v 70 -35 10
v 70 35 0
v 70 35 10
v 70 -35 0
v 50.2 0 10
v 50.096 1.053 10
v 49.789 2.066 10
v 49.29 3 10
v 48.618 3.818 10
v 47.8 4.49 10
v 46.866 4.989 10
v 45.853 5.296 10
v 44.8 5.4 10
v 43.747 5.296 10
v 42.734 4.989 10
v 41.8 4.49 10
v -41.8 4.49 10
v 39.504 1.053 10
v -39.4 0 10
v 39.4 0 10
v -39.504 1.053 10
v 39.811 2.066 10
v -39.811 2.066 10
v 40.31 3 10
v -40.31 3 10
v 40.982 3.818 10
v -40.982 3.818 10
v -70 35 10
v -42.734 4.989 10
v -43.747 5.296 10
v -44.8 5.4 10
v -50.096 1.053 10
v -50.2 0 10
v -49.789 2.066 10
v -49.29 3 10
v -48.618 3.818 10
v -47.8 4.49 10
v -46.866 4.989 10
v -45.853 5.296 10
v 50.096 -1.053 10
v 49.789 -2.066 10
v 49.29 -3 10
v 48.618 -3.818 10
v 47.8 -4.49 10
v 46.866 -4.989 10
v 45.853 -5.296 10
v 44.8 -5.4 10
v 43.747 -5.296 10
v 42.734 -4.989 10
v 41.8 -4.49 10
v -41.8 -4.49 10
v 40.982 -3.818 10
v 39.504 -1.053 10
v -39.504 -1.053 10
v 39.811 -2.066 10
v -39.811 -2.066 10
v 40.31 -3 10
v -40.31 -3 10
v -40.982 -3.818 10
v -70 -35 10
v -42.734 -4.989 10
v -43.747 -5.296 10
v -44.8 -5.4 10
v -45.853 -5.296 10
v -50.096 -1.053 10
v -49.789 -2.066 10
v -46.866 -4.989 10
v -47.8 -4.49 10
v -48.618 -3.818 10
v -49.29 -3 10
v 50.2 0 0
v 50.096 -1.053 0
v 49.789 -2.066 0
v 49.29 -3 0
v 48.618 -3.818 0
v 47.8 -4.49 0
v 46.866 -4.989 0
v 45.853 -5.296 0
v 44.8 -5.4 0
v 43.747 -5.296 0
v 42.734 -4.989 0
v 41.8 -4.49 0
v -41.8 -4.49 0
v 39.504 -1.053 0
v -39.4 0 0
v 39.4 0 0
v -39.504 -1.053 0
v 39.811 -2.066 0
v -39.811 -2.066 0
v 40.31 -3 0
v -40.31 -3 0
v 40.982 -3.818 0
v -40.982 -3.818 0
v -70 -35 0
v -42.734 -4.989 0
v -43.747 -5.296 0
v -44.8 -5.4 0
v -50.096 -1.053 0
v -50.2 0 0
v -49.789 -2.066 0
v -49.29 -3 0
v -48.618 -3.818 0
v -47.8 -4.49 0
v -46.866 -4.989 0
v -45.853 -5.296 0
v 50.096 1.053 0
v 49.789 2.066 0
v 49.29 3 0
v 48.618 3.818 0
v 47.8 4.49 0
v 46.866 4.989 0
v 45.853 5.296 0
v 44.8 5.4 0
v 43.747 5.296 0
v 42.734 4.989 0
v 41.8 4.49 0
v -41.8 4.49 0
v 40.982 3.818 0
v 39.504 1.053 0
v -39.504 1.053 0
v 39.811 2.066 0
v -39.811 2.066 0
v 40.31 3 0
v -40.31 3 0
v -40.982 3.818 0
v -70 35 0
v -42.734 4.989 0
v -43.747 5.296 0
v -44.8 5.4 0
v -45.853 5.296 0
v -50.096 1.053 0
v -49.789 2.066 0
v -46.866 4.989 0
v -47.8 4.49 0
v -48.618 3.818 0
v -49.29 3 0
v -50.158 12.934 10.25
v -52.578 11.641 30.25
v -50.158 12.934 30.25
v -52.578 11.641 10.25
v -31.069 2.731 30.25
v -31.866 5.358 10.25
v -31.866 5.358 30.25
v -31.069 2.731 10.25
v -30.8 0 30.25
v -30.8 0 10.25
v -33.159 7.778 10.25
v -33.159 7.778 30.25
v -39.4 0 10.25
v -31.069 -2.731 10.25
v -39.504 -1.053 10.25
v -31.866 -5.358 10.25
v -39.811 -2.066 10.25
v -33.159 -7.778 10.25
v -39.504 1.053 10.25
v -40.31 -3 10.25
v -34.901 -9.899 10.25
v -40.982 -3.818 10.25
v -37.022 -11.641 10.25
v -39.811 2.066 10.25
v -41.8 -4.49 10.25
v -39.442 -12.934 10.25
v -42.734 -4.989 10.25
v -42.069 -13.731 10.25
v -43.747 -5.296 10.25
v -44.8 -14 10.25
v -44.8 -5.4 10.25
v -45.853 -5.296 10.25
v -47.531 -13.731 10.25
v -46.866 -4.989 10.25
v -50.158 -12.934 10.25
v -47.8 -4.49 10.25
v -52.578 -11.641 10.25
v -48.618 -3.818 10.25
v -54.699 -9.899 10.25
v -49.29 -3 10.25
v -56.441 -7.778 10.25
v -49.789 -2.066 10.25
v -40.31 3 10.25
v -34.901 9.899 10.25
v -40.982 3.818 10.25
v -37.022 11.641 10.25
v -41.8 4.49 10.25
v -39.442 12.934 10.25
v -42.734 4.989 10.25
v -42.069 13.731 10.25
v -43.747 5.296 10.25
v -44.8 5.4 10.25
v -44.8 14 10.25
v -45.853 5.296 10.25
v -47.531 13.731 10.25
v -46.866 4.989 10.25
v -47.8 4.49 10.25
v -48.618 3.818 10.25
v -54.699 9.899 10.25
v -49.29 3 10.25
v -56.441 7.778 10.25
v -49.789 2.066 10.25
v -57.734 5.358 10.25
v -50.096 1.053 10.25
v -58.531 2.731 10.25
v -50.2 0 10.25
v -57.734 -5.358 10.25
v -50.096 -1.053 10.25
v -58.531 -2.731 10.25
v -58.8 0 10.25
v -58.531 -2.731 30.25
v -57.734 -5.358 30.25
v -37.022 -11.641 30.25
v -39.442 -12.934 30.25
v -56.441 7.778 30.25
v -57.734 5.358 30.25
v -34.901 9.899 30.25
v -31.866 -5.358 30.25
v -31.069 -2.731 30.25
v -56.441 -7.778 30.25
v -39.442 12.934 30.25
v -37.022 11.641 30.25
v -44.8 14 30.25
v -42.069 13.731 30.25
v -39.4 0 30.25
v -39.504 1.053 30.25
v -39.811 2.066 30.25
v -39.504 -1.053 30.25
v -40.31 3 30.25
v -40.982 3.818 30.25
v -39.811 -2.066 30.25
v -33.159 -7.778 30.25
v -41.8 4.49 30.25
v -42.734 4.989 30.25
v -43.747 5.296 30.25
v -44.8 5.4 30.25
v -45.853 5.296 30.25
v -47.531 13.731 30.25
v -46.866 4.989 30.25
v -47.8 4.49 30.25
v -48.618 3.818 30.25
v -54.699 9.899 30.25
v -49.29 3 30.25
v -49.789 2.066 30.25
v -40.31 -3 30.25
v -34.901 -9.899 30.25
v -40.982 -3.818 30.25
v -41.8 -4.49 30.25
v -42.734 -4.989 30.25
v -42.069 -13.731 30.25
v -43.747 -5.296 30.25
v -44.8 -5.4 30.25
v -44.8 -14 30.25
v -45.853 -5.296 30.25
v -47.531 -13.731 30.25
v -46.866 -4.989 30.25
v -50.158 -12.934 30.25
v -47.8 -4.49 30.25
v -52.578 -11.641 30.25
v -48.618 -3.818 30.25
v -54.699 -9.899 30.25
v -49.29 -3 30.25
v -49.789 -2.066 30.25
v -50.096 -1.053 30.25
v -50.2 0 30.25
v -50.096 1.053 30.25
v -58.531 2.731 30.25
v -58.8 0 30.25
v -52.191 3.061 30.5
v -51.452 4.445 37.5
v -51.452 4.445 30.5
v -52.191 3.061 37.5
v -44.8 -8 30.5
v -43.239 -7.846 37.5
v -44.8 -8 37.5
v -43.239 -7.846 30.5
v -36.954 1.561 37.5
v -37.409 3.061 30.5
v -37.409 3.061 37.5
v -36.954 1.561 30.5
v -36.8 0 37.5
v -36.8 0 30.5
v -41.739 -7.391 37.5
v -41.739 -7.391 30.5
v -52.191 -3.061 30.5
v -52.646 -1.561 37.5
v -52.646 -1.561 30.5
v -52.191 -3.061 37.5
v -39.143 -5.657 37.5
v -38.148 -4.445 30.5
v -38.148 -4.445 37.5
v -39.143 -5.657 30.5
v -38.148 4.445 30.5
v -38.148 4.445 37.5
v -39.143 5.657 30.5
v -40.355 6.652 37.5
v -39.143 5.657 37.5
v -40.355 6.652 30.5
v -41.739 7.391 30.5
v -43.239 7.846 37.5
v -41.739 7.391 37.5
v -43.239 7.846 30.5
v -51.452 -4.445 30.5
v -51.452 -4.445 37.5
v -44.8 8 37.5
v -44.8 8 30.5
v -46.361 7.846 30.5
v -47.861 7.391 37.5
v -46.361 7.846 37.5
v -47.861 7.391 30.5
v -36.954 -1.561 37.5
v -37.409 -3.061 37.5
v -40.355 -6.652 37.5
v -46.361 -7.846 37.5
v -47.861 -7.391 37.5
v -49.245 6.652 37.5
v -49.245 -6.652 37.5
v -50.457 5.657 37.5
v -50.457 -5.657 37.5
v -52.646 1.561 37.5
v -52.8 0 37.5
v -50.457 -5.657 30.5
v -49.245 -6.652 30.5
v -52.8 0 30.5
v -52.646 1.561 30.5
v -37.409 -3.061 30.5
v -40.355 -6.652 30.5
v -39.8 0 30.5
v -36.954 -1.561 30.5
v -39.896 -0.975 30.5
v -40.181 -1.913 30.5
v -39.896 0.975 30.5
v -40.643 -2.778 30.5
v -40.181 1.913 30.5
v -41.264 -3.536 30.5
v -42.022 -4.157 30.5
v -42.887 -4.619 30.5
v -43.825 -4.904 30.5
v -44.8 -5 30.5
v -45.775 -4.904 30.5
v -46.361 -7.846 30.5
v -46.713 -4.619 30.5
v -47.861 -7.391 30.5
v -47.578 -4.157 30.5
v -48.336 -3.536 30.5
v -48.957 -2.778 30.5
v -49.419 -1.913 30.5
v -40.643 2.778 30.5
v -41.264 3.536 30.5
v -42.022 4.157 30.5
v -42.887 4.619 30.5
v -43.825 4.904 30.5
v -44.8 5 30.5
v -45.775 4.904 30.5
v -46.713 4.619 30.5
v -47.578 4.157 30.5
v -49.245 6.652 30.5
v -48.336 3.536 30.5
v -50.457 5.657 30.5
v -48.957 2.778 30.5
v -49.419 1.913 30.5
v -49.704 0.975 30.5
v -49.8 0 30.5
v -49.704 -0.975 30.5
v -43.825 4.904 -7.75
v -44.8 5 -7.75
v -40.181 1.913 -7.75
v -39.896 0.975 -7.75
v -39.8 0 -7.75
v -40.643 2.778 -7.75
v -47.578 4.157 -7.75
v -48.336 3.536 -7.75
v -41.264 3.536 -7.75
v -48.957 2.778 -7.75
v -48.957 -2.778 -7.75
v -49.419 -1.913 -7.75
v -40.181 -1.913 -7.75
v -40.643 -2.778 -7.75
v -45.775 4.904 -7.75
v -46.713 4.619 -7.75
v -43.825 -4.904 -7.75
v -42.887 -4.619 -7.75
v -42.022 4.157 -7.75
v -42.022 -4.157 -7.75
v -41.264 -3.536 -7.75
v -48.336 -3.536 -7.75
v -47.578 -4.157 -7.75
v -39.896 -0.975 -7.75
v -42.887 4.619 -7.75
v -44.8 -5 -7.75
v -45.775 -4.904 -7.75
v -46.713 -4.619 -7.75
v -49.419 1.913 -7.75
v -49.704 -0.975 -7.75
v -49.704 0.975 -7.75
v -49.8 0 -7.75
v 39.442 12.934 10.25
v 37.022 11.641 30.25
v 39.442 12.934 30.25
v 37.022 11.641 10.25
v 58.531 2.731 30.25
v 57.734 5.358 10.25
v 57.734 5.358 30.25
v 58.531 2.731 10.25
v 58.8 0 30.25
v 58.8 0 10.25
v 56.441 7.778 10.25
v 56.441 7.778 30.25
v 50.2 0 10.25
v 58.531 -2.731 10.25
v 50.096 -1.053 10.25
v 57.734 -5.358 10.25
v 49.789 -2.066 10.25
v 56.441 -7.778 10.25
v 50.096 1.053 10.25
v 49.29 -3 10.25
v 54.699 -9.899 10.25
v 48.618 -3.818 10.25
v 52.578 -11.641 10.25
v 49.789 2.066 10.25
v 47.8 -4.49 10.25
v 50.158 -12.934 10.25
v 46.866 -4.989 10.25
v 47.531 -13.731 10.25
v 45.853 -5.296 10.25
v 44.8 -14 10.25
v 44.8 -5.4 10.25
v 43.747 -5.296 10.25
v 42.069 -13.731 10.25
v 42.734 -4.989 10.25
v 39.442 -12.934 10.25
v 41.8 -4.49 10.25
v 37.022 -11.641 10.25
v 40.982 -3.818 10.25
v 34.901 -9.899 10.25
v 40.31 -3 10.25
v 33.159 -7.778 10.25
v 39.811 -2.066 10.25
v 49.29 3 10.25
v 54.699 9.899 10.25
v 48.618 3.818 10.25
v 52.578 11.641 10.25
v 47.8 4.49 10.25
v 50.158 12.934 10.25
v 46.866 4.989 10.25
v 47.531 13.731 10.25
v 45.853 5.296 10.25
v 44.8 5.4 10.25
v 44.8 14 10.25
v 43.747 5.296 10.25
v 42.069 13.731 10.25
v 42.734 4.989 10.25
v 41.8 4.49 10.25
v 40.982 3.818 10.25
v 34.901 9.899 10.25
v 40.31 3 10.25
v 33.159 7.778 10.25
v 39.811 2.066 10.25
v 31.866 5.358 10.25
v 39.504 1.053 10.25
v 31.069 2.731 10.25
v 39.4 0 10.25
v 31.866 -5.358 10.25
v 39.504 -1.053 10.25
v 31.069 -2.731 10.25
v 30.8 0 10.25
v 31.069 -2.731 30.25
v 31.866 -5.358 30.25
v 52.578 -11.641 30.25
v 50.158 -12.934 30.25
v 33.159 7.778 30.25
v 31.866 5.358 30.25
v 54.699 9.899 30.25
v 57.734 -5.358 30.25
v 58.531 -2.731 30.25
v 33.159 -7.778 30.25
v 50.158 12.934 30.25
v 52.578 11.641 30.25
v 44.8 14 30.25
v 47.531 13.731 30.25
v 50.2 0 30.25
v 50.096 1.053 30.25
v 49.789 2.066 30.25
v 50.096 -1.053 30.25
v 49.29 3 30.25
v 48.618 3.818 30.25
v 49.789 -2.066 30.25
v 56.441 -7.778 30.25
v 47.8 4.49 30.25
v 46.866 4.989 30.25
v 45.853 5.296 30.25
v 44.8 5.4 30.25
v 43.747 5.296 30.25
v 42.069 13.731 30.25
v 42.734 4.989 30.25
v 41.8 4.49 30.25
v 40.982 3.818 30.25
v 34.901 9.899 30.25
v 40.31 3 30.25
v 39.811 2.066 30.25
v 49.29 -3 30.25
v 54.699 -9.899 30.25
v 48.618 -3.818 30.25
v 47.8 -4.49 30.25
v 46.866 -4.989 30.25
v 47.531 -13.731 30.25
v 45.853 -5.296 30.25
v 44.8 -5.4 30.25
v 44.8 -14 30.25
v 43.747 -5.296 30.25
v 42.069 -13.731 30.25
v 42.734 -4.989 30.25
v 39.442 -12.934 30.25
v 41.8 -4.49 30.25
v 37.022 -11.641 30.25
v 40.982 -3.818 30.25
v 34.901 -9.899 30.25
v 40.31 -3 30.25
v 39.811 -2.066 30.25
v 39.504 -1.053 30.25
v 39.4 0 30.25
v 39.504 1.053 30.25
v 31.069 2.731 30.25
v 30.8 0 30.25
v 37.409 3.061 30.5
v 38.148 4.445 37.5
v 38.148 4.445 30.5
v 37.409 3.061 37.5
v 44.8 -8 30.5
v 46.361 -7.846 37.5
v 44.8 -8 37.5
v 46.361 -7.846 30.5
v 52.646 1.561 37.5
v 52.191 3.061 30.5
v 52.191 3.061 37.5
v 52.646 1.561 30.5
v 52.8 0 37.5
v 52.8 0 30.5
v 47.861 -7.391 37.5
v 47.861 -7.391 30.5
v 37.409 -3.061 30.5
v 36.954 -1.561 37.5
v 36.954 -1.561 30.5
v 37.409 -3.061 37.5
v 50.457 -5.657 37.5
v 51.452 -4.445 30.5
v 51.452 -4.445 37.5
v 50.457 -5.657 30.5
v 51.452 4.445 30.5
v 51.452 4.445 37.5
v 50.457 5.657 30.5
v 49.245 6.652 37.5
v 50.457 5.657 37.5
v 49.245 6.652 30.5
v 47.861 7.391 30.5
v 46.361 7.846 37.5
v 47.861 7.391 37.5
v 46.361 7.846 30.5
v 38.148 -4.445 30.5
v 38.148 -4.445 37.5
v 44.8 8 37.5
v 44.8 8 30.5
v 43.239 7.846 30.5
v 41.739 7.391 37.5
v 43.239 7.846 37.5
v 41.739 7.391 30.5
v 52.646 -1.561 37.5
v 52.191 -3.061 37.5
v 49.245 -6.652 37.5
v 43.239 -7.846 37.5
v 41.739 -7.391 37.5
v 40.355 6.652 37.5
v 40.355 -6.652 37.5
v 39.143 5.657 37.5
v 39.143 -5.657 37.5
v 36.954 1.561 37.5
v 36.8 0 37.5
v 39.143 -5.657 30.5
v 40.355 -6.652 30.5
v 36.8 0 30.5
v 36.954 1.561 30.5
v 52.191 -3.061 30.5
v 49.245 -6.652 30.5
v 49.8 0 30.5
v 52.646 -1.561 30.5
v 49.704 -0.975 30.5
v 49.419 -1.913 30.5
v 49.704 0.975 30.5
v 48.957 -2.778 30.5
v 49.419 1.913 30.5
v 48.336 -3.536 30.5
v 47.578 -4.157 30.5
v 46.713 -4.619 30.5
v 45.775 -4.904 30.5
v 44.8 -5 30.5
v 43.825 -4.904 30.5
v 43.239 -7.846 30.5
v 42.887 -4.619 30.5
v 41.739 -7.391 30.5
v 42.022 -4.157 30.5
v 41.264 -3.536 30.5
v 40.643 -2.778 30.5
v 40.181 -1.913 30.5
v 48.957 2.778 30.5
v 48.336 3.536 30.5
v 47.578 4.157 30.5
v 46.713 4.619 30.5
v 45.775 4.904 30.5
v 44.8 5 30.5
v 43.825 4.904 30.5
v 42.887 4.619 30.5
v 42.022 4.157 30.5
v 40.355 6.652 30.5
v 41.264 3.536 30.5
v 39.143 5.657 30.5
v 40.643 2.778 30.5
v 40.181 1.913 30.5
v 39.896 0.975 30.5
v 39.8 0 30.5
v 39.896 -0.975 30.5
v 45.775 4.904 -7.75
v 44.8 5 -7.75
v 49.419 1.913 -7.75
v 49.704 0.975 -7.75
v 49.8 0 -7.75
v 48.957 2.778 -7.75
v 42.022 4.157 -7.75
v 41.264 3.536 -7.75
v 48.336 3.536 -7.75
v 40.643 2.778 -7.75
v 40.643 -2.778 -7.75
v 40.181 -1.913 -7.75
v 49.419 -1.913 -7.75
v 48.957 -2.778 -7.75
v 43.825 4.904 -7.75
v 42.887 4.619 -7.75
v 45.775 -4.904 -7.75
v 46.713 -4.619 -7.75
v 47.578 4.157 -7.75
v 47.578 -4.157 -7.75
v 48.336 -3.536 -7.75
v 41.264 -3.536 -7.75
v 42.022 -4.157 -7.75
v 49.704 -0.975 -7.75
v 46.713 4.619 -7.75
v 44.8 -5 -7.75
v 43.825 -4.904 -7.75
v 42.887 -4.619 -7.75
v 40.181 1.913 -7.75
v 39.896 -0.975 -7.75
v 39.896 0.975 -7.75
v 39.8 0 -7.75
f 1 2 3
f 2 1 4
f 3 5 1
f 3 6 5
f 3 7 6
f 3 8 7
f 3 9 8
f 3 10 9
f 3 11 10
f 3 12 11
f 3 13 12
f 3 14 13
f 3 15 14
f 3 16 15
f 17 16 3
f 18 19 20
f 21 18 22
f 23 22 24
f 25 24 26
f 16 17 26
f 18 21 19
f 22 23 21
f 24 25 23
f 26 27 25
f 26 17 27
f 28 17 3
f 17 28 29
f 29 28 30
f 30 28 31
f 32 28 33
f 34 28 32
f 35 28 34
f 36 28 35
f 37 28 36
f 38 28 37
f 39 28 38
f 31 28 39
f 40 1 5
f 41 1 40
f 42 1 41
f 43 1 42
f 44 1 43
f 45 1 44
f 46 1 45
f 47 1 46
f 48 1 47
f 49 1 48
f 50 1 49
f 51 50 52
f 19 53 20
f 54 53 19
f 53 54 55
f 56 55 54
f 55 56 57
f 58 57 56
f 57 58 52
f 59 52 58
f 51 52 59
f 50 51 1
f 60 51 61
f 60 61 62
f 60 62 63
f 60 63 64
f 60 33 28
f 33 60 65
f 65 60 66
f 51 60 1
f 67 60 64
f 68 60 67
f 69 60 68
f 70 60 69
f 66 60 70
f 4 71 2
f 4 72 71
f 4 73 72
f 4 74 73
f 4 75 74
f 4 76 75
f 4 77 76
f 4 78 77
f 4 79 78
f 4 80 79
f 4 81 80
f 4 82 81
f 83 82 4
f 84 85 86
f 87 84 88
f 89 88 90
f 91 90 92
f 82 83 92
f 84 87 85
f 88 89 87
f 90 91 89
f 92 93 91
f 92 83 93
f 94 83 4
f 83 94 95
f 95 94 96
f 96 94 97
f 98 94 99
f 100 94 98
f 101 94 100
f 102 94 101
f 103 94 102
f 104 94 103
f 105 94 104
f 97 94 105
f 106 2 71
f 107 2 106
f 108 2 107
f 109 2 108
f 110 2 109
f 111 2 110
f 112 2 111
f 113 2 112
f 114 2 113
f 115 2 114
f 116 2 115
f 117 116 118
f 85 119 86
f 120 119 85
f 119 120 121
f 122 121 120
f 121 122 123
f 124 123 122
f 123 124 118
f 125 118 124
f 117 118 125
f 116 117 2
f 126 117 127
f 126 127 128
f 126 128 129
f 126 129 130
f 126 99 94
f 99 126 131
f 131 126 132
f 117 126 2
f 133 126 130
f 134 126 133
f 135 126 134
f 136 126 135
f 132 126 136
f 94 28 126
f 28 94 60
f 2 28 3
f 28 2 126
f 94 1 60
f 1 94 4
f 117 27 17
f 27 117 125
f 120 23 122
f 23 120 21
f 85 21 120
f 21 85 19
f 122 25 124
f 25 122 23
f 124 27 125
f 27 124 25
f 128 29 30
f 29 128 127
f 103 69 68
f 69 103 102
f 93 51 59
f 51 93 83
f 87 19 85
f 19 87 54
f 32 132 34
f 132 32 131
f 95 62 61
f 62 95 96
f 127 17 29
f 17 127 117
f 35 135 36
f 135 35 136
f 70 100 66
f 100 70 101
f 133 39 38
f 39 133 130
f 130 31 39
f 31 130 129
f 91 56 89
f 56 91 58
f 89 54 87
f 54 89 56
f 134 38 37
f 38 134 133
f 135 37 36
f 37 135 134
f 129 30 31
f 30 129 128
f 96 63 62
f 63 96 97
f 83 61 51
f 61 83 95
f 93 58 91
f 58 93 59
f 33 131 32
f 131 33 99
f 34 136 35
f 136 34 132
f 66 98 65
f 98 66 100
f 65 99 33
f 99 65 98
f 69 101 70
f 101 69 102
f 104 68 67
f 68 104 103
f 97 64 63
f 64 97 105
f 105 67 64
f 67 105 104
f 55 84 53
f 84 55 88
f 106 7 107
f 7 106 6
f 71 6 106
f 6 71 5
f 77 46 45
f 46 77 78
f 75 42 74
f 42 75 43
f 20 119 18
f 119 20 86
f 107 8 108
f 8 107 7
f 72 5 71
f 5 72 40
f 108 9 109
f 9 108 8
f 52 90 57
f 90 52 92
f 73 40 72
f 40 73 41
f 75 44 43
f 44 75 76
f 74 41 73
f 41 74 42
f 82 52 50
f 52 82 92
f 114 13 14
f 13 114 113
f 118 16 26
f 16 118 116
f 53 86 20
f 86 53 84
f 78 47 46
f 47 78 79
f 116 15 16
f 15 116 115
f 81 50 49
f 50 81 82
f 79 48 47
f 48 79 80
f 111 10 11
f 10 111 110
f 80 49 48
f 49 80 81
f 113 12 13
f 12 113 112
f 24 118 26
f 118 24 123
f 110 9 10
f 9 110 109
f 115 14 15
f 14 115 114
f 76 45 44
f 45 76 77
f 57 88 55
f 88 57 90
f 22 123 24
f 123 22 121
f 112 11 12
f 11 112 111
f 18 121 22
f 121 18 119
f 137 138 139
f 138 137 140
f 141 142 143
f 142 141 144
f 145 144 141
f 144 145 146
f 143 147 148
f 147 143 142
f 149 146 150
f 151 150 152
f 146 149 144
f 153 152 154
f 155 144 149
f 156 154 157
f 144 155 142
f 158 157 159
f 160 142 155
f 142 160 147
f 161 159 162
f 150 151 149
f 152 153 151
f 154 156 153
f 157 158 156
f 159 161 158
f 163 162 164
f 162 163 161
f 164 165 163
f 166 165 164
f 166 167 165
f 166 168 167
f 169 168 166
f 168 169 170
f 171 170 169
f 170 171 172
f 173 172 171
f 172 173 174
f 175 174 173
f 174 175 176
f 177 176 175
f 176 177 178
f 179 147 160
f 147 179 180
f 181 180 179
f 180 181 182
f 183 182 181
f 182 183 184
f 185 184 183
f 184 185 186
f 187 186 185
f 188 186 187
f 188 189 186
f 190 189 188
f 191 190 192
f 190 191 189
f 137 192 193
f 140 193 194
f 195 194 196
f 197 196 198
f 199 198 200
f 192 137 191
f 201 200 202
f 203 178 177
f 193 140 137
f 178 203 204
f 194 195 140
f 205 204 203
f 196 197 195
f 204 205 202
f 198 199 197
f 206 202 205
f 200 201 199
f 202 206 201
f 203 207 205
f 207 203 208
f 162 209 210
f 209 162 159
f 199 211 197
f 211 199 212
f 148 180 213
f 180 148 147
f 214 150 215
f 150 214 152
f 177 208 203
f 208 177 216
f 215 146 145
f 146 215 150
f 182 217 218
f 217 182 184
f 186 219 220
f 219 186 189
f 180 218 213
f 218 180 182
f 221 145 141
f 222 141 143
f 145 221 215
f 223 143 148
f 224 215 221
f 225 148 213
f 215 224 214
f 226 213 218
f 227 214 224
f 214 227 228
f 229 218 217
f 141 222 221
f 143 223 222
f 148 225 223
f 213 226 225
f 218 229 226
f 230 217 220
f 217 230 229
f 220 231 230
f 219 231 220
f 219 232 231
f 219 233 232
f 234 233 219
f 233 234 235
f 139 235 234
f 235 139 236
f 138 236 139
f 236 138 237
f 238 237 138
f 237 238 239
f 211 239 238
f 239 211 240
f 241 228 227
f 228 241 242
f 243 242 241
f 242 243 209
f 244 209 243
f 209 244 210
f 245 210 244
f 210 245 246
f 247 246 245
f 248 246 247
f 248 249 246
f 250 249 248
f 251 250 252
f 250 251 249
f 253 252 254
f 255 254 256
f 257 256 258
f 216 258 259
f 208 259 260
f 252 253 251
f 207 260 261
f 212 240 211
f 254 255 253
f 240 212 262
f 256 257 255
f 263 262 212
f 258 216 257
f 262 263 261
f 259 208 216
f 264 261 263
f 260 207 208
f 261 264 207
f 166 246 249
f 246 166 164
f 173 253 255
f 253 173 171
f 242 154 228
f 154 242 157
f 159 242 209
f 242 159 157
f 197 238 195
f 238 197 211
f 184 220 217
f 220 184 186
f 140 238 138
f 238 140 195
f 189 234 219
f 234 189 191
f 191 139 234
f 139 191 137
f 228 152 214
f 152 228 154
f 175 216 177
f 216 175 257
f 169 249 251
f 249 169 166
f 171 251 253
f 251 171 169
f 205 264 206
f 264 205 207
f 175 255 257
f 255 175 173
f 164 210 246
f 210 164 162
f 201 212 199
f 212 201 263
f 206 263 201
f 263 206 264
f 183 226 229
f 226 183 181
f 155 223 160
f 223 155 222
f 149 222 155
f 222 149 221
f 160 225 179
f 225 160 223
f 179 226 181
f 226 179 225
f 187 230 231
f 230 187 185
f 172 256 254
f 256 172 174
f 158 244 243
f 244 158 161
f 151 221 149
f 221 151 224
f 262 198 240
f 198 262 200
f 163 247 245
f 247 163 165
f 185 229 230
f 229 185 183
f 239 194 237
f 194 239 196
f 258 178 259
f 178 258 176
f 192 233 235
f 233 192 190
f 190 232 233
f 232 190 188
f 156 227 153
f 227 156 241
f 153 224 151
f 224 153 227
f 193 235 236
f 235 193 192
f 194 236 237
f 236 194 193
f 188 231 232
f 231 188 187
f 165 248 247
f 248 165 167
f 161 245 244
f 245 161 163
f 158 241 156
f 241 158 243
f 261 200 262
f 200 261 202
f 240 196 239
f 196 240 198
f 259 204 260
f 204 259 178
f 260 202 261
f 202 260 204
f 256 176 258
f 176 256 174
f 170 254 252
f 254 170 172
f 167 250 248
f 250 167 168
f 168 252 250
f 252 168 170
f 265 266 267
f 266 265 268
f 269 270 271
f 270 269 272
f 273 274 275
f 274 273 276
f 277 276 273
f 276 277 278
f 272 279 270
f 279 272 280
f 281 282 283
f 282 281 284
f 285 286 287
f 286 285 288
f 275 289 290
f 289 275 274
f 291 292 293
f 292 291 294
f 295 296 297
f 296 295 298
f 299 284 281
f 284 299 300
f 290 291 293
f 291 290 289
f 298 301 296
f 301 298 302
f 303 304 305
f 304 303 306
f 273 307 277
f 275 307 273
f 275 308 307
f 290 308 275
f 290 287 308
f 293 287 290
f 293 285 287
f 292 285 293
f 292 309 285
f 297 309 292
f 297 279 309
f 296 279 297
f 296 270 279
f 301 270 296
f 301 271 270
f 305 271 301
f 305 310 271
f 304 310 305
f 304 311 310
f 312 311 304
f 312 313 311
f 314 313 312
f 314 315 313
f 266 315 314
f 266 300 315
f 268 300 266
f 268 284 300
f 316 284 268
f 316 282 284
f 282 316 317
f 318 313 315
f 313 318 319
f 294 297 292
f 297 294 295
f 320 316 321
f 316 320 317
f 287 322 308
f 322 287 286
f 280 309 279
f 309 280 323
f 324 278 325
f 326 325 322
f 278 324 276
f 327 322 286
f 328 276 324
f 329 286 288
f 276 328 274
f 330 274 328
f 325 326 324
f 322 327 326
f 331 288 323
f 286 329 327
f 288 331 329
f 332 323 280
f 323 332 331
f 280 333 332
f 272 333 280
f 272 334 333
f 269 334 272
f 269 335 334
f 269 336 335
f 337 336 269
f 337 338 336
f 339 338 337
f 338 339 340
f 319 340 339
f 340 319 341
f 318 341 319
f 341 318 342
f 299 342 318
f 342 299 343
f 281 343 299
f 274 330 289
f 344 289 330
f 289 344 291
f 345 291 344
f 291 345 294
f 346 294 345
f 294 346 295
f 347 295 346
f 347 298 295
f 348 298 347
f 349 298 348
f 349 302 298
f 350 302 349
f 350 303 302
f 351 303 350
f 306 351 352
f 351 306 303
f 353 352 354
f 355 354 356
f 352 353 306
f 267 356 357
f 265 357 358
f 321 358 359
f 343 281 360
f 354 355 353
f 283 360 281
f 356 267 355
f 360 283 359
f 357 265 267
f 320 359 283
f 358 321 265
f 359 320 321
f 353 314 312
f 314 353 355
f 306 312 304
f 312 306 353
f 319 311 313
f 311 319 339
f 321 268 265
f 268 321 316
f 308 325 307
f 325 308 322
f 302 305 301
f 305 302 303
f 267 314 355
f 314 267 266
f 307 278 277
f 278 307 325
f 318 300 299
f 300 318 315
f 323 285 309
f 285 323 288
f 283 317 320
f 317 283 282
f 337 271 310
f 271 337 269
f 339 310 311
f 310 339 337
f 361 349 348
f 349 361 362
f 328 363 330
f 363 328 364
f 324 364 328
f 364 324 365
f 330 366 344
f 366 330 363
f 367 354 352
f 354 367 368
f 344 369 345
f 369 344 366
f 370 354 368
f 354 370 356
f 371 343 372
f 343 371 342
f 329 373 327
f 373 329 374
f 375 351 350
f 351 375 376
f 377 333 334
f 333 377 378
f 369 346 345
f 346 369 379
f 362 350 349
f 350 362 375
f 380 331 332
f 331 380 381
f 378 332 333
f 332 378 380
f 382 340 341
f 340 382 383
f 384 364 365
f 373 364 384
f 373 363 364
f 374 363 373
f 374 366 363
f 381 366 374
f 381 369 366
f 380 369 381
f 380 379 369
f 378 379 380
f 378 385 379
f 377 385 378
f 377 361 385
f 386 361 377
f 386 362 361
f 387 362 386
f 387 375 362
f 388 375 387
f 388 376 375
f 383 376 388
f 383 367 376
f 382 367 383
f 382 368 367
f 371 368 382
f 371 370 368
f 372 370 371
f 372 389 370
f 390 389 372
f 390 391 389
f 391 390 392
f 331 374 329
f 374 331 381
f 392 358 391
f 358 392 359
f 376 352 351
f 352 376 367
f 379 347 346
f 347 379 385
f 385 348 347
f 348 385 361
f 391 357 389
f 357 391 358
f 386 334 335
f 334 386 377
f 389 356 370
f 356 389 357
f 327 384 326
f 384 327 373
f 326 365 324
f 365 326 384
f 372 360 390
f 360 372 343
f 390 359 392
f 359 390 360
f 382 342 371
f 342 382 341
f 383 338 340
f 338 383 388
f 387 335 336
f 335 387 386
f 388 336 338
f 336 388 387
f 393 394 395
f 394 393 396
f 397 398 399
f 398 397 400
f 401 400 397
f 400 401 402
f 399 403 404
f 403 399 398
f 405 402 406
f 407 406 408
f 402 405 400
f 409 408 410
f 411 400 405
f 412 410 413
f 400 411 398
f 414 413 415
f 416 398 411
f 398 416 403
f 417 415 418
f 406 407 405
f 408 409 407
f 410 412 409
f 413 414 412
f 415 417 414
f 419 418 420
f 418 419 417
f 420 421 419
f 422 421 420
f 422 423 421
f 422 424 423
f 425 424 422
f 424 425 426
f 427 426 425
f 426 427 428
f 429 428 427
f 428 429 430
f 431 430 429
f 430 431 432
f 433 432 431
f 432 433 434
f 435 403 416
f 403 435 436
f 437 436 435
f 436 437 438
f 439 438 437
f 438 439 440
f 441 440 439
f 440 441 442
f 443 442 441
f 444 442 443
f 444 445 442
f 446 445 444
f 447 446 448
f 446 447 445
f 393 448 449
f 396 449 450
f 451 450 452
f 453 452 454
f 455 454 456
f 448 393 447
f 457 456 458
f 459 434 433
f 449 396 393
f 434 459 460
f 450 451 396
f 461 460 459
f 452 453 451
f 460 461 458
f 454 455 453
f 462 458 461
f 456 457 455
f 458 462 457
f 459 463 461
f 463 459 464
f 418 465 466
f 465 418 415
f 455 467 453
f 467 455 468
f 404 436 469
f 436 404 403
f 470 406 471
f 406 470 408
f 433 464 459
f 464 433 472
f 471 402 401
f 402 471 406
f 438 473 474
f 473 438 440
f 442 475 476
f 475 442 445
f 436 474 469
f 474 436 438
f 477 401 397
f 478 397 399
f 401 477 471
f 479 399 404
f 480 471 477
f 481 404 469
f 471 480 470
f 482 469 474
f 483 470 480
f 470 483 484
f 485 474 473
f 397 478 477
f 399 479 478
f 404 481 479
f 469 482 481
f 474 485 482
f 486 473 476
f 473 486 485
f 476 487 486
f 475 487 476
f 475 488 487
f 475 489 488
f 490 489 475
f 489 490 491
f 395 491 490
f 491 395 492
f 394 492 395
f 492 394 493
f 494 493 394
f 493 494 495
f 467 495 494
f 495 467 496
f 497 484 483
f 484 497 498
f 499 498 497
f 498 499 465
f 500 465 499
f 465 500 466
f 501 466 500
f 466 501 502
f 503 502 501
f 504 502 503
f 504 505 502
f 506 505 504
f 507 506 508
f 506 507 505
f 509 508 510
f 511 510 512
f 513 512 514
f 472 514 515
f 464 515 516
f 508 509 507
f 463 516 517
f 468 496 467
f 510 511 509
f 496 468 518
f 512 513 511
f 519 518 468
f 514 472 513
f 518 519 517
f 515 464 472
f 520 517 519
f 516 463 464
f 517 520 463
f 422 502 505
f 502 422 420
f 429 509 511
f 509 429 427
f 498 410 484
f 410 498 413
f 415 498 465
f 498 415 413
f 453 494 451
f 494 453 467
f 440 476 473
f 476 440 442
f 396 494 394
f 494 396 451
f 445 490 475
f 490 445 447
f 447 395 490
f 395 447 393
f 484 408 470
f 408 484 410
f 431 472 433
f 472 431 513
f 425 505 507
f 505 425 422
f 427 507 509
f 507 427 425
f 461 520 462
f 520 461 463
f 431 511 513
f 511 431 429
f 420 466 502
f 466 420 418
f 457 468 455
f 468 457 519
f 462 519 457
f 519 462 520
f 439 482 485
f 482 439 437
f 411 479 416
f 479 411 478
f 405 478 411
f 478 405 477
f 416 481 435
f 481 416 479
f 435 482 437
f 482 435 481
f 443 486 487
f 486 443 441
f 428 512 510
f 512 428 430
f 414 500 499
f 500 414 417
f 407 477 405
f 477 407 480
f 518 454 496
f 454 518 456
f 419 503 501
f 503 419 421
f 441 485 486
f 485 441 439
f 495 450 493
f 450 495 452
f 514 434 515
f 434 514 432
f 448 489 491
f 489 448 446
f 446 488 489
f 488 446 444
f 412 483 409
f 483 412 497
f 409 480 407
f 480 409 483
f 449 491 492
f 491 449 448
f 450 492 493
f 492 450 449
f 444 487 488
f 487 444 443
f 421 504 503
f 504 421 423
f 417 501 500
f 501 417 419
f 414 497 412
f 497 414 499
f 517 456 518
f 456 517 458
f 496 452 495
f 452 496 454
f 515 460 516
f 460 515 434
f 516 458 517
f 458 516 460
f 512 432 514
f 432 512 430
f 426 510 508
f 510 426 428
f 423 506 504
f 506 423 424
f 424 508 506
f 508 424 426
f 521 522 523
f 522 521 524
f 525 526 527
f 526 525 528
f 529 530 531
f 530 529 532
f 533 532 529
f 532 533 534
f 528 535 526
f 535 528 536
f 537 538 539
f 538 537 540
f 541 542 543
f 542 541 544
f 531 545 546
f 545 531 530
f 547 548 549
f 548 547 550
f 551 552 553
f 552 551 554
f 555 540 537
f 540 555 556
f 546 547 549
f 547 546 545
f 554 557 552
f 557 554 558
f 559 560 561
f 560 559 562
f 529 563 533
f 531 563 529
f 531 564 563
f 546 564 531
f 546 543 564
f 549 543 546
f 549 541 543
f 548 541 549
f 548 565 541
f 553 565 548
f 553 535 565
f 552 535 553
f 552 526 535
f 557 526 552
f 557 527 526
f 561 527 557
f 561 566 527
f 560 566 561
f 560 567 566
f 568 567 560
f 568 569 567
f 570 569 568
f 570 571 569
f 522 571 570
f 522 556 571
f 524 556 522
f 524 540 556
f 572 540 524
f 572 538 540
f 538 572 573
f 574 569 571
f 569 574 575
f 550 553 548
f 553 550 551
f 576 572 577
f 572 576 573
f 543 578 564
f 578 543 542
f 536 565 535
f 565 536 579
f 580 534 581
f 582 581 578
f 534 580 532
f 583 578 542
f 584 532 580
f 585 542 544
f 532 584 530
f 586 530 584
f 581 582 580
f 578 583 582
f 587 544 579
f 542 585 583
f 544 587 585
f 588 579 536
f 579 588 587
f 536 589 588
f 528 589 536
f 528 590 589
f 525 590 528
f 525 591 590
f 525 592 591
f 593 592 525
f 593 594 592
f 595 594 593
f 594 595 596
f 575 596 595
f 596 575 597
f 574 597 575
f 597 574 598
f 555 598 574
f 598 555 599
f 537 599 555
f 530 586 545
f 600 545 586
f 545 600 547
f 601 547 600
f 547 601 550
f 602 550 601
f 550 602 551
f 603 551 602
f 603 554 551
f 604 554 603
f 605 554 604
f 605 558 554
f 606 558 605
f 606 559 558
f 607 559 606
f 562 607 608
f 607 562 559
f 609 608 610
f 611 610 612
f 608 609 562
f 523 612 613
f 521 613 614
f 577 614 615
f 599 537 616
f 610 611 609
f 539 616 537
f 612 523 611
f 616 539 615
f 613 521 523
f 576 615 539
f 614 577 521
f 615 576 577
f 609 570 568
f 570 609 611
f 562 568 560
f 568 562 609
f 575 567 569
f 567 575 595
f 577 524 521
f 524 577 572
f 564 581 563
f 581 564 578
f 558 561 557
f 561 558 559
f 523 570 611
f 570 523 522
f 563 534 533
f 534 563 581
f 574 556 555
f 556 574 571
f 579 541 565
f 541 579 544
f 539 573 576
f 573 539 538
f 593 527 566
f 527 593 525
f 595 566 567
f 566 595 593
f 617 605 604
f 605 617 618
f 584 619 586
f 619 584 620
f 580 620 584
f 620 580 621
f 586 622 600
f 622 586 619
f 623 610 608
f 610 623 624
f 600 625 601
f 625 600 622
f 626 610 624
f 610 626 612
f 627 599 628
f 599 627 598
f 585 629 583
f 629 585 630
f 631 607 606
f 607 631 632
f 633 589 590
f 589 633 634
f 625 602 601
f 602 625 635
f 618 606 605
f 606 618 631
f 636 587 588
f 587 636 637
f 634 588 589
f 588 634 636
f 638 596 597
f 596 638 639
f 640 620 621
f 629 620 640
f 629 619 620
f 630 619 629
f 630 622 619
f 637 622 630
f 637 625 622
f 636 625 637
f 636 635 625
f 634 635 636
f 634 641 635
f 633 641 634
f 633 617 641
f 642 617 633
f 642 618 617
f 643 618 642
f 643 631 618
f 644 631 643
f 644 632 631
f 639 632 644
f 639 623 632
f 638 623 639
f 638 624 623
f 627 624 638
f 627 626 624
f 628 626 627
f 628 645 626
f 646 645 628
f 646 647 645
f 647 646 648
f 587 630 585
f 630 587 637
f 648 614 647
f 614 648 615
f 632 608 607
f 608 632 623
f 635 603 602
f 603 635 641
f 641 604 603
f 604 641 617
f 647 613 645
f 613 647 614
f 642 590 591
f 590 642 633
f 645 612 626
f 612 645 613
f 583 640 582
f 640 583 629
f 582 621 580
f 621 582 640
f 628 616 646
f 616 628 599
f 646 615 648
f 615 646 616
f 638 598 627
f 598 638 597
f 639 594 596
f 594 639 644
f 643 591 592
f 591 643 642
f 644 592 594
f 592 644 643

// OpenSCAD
$fn = 32;

// ------------------------------------------------------------------------
// Standoff columns: 2 d28 standoffs, bolts d10
// Every part is its own module, assembly() places them once.
// ------------------------------------------------------------------------

// --- part 1 ---
module base_plate() {
  difference() {
    translate([-70, -35, 0]) cube([140, 70, 10]);
    translate([-44.8, 0, -1]) cylinder(h = 12, d = 10.8);
    translate([44.8, 0, -1]) cylinder(h = 12, d = 10.8);
  }
}

// --- part 2 ---
module spacer1() {
  difference() {
      translate([0, 0, 0]) cylinder(h = 20, d = 28);
      translate([0, 0, -1]) cylinder(h = 22, d = 10.8);
    }
}

// --- part 3 ---
module bolt1() {
  cylinder(h = 7, d = 16);
  translate([0, 0, -38.25]) cylinder(h = 38.25, d = 10);
}

// --- part 4 ---
module spacer2() {
  difference() {
      translate([0, 0, 0]) cylinder(h = 20, d = 28);
      translate([0, 0, -1]) cylinder(h = 22, d = 10.8);
    }
}

// --- part 5 ---
module bolt2() {
  cylinder(h = 7, d = 16);
  translate([0, 0, -38.25]) cylinder(h = 38.25, d = 10);
}

// --- assembly ---
module assembly() {
  translate([0, 0, 0]) rotate([0, 0, 0]) base_plate();
  translate([-44.8, 0, 10.25]) rotate([0, 0, 0]) spacer1();
  translate([-44.8, 0, 30.5]) rotate([0, 0, 0]) bolt1();
  translate([44.8, 0, 10.25]) rotate([0, 0, 0]) spacer2();
  translate([44.8, 0, 30.5]) rotate([0, 0, 0]) bolt2();
}

assembly();
